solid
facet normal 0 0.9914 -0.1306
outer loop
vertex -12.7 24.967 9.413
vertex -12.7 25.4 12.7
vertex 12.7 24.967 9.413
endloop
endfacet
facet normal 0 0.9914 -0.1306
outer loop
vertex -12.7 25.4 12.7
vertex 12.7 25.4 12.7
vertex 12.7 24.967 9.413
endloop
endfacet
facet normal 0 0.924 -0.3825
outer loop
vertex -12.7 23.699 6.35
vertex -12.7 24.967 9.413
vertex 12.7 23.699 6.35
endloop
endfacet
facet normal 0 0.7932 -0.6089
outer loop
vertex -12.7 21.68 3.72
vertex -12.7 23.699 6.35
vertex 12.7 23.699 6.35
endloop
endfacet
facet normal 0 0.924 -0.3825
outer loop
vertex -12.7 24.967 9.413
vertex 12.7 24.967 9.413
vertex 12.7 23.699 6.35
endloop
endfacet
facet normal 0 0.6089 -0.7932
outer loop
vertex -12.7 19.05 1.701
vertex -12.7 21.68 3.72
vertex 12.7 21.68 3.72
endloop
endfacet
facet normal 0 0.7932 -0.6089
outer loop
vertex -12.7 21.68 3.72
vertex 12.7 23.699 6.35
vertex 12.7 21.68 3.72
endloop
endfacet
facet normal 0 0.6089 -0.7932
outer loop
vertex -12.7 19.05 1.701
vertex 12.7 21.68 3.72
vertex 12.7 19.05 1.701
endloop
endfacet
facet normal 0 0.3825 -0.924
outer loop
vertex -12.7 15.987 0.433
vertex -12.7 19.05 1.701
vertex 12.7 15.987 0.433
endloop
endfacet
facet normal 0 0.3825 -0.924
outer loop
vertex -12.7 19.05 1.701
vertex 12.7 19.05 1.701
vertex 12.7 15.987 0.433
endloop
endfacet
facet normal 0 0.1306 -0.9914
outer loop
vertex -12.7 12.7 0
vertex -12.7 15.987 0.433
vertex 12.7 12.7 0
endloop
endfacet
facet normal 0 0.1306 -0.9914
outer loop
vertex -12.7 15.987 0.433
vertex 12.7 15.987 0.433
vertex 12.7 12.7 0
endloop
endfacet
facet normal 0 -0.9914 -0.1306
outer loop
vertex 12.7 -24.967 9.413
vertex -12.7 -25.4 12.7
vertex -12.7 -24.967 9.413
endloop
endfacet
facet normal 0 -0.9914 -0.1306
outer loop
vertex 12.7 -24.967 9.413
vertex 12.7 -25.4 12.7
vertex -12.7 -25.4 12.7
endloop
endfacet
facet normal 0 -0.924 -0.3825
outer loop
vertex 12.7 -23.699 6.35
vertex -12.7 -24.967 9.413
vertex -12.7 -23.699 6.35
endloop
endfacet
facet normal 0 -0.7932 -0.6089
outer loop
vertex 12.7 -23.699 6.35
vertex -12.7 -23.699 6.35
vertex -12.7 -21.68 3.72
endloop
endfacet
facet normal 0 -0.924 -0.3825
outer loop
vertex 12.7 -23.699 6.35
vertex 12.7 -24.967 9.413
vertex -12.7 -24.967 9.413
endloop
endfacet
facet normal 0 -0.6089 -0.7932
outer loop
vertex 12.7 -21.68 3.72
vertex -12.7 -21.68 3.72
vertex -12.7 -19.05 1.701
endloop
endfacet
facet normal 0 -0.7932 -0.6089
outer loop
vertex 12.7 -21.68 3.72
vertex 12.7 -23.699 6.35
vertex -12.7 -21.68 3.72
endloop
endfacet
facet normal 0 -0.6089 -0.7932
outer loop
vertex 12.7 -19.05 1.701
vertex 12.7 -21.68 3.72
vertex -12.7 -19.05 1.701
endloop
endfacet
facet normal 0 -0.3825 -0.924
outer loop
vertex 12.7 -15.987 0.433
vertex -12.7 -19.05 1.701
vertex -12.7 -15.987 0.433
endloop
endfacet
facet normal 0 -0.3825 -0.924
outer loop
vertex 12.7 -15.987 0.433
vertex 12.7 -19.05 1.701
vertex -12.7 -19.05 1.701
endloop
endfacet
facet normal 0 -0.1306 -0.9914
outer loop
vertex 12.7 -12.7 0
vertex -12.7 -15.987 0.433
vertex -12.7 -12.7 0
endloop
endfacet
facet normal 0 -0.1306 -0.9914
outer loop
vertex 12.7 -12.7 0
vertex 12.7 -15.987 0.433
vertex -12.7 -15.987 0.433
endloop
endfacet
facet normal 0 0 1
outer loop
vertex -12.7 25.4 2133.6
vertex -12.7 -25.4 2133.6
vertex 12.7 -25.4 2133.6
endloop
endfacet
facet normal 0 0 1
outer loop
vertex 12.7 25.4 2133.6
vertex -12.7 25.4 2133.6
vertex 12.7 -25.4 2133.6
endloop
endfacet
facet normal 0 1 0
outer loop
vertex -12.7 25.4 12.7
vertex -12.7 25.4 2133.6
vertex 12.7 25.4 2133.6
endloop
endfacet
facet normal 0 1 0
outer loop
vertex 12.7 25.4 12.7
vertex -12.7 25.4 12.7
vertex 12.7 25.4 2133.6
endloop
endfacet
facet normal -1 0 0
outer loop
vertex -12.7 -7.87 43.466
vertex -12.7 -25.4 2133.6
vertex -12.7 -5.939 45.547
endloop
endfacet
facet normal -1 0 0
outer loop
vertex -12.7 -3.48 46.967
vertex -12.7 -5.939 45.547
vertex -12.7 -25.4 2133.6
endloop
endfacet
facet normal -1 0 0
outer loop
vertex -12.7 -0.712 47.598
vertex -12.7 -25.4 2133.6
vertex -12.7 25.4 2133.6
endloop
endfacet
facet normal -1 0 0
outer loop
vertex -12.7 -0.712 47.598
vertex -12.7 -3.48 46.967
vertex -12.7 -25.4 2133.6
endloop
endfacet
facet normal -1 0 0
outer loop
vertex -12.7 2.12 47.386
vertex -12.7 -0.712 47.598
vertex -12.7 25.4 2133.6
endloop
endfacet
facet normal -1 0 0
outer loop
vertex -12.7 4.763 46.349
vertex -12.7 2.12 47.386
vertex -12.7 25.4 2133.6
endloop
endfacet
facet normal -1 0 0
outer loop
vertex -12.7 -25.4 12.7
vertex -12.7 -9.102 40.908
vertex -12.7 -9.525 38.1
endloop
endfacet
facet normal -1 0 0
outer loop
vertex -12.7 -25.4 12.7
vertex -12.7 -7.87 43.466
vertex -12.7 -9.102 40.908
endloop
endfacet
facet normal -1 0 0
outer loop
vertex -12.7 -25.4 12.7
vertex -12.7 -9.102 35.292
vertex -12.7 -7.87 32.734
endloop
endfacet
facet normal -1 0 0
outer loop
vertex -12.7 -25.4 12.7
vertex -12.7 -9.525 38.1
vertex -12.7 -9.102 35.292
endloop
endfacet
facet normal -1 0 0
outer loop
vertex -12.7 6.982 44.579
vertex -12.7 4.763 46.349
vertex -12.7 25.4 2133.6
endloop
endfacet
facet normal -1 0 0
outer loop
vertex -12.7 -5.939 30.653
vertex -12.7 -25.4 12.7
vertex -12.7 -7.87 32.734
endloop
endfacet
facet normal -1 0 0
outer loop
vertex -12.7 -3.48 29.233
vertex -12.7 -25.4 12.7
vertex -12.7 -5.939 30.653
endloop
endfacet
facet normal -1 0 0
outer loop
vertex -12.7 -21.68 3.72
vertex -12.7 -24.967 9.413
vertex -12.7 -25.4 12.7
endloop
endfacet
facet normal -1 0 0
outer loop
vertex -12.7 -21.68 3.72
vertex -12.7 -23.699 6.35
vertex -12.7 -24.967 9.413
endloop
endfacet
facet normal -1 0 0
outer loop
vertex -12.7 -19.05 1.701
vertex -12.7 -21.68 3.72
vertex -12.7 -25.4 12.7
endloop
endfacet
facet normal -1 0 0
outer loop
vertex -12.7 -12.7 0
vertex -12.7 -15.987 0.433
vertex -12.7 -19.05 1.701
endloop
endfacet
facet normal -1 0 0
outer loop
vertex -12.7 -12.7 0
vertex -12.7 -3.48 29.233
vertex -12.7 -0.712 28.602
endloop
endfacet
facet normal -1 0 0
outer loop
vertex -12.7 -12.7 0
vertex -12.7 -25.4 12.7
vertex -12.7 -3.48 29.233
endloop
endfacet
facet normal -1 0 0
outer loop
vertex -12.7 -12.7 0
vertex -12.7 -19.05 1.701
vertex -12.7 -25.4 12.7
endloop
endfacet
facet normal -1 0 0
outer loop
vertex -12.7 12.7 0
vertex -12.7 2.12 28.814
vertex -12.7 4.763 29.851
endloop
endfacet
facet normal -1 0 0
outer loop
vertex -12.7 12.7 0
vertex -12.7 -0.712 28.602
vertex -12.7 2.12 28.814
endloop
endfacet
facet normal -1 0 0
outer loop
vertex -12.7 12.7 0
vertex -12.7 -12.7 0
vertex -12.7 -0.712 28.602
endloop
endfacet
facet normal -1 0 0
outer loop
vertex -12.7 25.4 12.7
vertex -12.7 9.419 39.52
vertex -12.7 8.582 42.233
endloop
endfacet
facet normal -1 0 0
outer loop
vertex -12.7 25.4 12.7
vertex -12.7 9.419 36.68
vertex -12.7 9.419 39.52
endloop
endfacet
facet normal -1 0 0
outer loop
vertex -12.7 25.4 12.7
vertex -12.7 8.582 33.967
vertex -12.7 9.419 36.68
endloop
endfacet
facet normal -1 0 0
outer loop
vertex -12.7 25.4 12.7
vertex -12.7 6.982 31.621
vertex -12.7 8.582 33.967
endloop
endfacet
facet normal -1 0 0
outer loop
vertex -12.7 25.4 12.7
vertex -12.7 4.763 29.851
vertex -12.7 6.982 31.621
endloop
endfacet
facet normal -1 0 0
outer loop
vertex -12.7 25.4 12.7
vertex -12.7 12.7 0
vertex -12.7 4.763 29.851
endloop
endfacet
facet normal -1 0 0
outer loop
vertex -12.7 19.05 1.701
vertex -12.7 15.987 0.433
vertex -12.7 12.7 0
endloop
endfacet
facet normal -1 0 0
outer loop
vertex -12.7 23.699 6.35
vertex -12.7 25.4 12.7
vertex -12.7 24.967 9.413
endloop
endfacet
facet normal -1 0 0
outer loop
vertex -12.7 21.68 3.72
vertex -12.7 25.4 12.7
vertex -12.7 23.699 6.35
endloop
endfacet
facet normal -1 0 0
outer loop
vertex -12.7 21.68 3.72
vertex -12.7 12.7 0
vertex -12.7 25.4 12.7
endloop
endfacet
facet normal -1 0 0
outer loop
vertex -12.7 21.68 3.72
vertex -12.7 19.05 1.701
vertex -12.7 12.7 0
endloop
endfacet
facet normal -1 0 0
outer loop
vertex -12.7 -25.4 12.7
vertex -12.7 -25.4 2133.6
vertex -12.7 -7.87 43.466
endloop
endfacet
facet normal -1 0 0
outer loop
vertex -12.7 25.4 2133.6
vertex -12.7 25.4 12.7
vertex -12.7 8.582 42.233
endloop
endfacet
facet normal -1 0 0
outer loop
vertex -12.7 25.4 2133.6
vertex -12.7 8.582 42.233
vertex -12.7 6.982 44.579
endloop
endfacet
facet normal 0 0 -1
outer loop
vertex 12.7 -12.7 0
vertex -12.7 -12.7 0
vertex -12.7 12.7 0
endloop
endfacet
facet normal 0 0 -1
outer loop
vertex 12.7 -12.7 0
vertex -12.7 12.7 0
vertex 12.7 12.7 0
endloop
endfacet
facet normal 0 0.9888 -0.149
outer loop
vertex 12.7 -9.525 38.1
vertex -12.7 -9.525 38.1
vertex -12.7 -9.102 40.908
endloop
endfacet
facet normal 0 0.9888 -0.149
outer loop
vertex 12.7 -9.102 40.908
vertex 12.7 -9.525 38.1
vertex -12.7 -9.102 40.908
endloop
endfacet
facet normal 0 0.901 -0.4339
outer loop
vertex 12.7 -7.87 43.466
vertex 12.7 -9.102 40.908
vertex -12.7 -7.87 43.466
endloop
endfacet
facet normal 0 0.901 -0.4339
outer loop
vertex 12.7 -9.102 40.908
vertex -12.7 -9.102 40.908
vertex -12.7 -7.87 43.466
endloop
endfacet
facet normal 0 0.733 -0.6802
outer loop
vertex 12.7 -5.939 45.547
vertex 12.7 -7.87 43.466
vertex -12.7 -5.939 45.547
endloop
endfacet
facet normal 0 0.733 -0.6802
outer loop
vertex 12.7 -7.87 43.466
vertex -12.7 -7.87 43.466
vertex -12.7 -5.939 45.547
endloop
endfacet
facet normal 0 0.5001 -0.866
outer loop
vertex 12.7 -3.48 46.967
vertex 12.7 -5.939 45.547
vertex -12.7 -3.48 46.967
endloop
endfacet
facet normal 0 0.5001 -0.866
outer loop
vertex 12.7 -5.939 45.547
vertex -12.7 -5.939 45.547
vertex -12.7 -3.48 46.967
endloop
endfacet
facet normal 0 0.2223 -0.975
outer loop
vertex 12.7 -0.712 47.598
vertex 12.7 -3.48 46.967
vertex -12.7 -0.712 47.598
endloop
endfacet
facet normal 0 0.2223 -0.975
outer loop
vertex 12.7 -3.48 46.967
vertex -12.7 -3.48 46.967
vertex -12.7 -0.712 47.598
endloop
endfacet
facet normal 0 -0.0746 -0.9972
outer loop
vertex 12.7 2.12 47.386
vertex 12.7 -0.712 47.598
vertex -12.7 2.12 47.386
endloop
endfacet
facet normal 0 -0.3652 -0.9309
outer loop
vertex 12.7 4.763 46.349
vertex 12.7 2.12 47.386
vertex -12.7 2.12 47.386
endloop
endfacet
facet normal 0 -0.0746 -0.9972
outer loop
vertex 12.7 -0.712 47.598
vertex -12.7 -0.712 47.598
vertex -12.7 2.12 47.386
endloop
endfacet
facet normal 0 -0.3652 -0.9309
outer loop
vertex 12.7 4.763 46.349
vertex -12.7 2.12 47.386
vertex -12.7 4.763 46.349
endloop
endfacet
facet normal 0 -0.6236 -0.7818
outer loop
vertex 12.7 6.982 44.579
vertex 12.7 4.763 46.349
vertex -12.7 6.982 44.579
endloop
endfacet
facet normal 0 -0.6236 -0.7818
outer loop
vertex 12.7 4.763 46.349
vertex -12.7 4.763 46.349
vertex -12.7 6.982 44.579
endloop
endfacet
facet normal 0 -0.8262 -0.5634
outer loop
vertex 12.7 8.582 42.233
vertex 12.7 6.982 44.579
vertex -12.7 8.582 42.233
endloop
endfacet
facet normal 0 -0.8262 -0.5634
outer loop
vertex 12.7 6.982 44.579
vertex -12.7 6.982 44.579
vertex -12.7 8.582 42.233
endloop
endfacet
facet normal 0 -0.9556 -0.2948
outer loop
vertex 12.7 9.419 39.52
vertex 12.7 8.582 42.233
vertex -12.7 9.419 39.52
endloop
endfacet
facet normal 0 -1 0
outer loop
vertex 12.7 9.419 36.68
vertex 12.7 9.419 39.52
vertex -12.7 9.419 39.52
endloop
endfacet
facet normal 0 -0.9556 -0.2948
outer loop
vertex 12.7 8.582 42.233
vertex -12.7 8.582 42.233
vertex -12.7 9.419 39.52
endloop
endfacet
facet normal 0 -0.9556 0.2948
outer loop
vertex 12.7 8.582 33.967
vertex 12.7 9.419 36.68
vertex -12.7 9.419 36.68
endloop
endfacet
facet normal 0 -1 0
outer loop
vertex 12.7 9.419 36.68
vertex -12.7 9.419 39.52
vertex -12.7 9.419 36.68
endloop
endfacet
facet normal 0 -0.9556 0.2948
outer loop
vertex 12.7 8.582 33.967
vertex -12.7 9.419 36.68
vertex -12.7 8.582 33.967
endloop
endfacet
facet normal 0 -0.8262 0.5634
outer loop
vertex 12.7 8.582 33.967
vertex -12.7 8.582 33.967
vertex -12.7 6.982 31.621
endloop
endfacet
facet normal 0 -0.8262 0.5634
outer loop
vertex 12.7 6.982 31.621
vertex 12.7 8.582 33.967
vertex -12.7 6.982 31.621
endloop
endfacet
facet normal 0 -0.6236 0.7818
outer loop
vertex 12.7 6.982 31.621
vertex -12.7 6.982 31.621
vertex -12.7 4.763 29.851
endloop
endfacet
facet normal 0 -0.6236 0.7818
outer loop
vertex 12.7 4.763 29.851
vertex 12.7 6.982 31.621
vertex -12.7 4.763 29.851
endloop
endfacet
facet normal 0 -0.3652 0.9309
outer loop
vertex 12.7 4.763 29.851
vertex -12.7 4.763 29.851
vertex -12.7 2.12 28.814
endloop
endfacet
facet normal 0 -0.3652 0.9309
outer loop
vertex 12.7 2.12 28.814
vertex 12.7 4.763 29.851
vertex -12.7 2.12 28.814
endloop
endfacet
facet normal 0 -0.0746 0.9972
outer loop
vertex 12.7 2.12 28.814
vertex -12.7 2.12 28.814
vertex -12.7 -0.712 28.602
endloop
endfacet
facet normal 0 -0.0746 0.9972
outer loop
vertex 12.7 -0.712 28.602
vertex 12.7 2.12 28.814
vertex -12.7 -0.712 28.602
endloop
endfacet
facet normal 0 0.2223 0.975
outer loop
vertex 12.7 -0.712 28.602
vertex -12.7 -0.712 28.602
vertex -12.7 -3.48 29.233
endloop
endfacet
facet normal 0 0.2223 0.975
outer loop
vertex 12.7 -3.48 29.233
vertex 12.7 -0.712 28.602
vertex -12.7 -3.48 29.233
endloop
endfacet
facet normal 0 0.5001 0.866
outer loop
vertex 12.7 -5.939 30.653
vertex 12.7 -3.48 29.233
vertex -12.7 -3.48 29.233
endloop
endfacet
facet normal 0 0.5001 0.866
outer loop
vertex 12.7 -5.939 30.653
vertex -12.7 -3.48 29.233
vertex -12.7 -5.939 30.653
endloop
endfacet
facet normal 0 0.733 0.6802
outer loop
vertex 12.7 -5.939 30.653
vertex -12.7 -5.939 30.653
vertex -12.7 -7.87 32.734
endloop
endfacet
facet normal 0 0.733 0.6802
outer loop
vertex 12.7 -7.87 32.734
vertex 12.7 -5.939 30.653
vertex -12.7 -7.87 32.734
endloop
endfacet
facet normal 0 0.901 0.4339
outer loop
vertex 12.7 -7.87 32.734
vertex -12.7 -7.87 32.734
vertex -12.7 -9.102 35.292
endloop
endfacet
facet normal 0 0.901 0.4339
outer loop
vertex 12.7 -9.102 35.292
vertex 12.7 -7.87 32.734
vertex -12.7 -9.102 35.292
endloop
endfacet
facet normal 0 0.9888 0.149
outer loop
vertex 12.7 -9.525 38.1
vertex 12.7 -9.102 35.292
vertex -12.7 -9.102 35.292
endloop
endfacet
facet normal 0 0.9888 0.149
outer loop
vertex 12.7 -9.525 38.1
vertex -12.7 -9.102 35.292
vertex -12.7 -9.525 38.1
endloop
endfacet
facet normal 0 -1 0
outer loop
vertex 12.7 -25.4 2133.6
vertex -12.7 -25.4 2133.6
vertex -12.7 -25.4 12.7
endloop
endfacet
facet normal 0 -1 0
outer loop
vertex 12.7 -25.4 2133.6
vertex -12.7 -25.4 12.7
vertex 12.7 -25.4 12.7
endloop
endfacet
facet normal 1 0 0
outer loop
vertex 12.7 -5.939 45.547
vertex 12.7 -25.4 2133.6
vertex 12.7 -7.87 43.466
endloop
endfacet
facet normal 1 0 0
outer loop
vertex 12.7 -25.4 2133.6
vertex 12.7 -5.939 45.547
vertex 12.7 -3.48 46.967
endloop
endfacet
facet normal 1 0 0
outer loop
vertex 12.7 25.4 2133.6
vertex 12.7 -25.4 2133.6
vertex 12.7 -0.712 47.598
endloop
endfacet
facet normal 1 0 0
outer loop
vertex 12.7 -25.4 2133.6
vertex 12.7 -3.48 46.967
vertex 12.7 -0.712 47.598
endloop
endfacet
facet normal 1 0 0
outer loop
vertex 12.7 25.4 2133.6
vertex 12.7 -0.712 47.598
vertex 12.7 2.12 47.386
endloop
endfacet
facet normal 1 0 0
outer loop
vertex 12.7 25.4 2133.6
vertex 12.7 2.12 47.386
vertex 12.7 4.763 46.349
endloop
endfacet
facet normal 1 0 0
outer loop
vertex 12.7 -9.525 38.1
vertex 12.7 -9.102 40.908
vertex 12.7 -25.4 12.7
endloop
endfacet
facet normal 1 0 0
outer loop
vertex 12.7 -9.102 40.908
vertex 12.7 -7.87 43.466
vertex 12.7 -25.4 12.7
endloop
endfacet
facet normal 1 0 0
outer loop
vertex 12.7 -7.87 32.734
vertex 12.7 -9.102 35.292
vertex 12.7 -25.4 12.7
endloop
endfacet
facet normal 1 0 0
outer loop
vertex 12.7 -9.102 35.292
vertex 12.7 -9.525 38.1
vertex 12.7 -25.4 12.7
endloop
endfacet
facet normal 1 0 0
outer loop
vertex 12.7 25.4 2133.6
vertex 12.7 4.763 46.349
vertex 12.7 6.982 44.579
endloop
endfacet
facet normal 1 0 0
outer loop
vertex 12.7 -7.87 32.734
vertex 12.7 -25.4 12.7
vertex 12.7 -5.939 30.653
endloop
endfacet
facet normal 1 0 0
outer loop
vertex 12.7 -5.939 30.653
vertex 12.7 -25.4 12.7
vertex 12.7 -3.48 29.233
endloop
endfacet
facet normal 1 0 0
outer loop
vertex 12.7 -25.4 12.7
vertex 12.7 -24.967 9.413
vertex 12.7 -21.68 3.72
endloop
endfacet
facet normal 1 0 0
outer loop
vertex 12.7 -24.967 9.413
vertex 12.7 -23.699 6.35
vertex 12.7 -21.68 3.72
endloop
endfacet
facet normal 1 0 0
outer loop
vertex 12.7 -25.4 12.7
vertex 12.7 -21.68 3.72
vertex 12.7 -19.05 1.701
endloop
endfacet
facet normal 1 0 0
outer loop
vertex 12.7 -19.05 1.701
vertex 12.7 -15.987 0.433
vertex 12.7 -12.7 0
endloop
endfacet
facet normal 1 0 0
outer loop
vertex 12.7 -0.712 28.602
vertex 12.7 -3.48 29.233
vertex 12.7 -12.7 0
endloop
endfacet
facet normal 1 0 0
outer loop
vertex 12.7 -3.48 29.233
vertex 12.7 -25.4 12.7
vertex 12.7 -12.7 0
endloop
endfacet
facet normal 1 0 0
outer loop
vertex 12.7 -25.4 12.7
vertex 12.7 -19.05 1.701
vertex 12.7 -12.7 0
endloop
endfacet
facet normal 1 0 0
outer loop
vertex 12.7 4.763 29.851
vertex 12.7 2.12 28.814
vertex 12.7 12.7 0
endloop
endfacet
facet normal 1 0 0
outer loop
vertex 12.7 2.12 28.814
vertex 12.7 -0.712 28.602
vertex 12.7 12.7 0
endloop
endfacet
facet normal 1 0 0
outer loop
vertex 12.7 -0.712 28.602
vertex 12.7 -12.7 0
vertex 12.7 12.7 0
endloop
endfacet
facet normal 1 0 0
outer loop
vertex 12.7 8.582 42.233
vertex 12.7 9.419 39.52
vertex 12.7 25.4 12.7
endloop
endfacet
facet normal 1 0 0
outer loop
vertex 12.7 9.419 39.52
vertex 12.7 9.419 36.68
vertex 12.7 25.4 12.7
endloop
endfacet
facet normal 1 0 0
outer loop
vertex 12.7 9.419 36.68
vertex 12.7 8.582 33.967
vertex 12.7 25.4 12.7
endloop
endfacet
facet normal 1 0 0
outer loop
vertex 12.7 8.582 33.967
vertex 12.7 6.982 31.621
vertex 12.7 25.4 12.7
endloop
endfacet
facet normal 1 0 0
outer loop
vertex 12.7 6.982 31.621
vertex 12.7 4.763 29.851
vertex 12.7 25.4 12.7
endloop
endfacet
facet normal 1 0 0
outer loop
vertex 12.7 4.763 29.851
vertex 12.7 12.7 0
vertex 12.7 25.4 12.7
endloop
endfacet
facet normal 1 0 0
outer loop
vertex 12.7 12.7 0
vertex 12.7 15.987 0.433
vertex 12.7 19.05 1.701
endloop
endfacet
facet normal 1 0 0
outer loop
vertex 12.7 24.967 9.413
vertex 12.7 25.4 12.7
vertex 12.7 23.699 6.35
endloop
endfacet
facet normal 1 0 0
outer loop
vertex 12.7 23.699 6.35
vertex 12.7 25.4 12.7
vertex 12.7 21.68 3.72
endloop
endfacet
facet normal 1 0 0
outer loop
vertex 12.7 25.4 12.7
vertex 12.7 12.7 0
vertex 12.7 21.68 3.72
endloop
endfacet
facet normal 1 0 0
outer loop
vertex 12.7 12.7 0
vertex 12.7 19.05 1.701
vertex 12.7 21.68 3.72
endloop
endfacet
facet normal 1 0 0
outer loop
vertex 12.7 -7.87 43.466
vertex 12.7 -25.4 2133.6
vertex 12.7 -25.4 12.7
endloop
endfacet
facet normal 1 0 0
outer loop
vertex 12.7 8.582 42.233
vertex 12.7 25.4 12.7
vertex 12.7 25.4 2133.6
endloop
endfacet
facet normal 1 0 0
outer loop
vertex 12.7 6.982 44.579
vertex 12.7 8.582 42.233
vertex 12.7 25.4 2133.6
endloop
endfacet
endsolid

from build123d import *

# Parameters (mm, degrees)
F0_W     = 25.4
F0_H     = 50.8
F1_DEPTH = 2133.6
F2_R     = 12.7
F4_D     = 19.05


with BuildPart() as f1:
    # F0 (on Top) → F1 (new body)
    with BuildSketch(Plane.XY):
        Rectangle(F0_W, F0_H)
    extrude(amount=F1_DEPTH)

    # F2
    f2_edges = [f1.edges().sort_by_distance(p)[0] for p in [
        (0, -25.4, 0),
        (0, 25.4, 0),
    ]]
    fillet(f2_edges, radius=F2_R)

    # F4 (through all)
    with Locations(Plane.YZ.offset(12.7)):
        with Locations((0, 38.1)):
            Hole(F4_D / 2)


solid = f1.part
